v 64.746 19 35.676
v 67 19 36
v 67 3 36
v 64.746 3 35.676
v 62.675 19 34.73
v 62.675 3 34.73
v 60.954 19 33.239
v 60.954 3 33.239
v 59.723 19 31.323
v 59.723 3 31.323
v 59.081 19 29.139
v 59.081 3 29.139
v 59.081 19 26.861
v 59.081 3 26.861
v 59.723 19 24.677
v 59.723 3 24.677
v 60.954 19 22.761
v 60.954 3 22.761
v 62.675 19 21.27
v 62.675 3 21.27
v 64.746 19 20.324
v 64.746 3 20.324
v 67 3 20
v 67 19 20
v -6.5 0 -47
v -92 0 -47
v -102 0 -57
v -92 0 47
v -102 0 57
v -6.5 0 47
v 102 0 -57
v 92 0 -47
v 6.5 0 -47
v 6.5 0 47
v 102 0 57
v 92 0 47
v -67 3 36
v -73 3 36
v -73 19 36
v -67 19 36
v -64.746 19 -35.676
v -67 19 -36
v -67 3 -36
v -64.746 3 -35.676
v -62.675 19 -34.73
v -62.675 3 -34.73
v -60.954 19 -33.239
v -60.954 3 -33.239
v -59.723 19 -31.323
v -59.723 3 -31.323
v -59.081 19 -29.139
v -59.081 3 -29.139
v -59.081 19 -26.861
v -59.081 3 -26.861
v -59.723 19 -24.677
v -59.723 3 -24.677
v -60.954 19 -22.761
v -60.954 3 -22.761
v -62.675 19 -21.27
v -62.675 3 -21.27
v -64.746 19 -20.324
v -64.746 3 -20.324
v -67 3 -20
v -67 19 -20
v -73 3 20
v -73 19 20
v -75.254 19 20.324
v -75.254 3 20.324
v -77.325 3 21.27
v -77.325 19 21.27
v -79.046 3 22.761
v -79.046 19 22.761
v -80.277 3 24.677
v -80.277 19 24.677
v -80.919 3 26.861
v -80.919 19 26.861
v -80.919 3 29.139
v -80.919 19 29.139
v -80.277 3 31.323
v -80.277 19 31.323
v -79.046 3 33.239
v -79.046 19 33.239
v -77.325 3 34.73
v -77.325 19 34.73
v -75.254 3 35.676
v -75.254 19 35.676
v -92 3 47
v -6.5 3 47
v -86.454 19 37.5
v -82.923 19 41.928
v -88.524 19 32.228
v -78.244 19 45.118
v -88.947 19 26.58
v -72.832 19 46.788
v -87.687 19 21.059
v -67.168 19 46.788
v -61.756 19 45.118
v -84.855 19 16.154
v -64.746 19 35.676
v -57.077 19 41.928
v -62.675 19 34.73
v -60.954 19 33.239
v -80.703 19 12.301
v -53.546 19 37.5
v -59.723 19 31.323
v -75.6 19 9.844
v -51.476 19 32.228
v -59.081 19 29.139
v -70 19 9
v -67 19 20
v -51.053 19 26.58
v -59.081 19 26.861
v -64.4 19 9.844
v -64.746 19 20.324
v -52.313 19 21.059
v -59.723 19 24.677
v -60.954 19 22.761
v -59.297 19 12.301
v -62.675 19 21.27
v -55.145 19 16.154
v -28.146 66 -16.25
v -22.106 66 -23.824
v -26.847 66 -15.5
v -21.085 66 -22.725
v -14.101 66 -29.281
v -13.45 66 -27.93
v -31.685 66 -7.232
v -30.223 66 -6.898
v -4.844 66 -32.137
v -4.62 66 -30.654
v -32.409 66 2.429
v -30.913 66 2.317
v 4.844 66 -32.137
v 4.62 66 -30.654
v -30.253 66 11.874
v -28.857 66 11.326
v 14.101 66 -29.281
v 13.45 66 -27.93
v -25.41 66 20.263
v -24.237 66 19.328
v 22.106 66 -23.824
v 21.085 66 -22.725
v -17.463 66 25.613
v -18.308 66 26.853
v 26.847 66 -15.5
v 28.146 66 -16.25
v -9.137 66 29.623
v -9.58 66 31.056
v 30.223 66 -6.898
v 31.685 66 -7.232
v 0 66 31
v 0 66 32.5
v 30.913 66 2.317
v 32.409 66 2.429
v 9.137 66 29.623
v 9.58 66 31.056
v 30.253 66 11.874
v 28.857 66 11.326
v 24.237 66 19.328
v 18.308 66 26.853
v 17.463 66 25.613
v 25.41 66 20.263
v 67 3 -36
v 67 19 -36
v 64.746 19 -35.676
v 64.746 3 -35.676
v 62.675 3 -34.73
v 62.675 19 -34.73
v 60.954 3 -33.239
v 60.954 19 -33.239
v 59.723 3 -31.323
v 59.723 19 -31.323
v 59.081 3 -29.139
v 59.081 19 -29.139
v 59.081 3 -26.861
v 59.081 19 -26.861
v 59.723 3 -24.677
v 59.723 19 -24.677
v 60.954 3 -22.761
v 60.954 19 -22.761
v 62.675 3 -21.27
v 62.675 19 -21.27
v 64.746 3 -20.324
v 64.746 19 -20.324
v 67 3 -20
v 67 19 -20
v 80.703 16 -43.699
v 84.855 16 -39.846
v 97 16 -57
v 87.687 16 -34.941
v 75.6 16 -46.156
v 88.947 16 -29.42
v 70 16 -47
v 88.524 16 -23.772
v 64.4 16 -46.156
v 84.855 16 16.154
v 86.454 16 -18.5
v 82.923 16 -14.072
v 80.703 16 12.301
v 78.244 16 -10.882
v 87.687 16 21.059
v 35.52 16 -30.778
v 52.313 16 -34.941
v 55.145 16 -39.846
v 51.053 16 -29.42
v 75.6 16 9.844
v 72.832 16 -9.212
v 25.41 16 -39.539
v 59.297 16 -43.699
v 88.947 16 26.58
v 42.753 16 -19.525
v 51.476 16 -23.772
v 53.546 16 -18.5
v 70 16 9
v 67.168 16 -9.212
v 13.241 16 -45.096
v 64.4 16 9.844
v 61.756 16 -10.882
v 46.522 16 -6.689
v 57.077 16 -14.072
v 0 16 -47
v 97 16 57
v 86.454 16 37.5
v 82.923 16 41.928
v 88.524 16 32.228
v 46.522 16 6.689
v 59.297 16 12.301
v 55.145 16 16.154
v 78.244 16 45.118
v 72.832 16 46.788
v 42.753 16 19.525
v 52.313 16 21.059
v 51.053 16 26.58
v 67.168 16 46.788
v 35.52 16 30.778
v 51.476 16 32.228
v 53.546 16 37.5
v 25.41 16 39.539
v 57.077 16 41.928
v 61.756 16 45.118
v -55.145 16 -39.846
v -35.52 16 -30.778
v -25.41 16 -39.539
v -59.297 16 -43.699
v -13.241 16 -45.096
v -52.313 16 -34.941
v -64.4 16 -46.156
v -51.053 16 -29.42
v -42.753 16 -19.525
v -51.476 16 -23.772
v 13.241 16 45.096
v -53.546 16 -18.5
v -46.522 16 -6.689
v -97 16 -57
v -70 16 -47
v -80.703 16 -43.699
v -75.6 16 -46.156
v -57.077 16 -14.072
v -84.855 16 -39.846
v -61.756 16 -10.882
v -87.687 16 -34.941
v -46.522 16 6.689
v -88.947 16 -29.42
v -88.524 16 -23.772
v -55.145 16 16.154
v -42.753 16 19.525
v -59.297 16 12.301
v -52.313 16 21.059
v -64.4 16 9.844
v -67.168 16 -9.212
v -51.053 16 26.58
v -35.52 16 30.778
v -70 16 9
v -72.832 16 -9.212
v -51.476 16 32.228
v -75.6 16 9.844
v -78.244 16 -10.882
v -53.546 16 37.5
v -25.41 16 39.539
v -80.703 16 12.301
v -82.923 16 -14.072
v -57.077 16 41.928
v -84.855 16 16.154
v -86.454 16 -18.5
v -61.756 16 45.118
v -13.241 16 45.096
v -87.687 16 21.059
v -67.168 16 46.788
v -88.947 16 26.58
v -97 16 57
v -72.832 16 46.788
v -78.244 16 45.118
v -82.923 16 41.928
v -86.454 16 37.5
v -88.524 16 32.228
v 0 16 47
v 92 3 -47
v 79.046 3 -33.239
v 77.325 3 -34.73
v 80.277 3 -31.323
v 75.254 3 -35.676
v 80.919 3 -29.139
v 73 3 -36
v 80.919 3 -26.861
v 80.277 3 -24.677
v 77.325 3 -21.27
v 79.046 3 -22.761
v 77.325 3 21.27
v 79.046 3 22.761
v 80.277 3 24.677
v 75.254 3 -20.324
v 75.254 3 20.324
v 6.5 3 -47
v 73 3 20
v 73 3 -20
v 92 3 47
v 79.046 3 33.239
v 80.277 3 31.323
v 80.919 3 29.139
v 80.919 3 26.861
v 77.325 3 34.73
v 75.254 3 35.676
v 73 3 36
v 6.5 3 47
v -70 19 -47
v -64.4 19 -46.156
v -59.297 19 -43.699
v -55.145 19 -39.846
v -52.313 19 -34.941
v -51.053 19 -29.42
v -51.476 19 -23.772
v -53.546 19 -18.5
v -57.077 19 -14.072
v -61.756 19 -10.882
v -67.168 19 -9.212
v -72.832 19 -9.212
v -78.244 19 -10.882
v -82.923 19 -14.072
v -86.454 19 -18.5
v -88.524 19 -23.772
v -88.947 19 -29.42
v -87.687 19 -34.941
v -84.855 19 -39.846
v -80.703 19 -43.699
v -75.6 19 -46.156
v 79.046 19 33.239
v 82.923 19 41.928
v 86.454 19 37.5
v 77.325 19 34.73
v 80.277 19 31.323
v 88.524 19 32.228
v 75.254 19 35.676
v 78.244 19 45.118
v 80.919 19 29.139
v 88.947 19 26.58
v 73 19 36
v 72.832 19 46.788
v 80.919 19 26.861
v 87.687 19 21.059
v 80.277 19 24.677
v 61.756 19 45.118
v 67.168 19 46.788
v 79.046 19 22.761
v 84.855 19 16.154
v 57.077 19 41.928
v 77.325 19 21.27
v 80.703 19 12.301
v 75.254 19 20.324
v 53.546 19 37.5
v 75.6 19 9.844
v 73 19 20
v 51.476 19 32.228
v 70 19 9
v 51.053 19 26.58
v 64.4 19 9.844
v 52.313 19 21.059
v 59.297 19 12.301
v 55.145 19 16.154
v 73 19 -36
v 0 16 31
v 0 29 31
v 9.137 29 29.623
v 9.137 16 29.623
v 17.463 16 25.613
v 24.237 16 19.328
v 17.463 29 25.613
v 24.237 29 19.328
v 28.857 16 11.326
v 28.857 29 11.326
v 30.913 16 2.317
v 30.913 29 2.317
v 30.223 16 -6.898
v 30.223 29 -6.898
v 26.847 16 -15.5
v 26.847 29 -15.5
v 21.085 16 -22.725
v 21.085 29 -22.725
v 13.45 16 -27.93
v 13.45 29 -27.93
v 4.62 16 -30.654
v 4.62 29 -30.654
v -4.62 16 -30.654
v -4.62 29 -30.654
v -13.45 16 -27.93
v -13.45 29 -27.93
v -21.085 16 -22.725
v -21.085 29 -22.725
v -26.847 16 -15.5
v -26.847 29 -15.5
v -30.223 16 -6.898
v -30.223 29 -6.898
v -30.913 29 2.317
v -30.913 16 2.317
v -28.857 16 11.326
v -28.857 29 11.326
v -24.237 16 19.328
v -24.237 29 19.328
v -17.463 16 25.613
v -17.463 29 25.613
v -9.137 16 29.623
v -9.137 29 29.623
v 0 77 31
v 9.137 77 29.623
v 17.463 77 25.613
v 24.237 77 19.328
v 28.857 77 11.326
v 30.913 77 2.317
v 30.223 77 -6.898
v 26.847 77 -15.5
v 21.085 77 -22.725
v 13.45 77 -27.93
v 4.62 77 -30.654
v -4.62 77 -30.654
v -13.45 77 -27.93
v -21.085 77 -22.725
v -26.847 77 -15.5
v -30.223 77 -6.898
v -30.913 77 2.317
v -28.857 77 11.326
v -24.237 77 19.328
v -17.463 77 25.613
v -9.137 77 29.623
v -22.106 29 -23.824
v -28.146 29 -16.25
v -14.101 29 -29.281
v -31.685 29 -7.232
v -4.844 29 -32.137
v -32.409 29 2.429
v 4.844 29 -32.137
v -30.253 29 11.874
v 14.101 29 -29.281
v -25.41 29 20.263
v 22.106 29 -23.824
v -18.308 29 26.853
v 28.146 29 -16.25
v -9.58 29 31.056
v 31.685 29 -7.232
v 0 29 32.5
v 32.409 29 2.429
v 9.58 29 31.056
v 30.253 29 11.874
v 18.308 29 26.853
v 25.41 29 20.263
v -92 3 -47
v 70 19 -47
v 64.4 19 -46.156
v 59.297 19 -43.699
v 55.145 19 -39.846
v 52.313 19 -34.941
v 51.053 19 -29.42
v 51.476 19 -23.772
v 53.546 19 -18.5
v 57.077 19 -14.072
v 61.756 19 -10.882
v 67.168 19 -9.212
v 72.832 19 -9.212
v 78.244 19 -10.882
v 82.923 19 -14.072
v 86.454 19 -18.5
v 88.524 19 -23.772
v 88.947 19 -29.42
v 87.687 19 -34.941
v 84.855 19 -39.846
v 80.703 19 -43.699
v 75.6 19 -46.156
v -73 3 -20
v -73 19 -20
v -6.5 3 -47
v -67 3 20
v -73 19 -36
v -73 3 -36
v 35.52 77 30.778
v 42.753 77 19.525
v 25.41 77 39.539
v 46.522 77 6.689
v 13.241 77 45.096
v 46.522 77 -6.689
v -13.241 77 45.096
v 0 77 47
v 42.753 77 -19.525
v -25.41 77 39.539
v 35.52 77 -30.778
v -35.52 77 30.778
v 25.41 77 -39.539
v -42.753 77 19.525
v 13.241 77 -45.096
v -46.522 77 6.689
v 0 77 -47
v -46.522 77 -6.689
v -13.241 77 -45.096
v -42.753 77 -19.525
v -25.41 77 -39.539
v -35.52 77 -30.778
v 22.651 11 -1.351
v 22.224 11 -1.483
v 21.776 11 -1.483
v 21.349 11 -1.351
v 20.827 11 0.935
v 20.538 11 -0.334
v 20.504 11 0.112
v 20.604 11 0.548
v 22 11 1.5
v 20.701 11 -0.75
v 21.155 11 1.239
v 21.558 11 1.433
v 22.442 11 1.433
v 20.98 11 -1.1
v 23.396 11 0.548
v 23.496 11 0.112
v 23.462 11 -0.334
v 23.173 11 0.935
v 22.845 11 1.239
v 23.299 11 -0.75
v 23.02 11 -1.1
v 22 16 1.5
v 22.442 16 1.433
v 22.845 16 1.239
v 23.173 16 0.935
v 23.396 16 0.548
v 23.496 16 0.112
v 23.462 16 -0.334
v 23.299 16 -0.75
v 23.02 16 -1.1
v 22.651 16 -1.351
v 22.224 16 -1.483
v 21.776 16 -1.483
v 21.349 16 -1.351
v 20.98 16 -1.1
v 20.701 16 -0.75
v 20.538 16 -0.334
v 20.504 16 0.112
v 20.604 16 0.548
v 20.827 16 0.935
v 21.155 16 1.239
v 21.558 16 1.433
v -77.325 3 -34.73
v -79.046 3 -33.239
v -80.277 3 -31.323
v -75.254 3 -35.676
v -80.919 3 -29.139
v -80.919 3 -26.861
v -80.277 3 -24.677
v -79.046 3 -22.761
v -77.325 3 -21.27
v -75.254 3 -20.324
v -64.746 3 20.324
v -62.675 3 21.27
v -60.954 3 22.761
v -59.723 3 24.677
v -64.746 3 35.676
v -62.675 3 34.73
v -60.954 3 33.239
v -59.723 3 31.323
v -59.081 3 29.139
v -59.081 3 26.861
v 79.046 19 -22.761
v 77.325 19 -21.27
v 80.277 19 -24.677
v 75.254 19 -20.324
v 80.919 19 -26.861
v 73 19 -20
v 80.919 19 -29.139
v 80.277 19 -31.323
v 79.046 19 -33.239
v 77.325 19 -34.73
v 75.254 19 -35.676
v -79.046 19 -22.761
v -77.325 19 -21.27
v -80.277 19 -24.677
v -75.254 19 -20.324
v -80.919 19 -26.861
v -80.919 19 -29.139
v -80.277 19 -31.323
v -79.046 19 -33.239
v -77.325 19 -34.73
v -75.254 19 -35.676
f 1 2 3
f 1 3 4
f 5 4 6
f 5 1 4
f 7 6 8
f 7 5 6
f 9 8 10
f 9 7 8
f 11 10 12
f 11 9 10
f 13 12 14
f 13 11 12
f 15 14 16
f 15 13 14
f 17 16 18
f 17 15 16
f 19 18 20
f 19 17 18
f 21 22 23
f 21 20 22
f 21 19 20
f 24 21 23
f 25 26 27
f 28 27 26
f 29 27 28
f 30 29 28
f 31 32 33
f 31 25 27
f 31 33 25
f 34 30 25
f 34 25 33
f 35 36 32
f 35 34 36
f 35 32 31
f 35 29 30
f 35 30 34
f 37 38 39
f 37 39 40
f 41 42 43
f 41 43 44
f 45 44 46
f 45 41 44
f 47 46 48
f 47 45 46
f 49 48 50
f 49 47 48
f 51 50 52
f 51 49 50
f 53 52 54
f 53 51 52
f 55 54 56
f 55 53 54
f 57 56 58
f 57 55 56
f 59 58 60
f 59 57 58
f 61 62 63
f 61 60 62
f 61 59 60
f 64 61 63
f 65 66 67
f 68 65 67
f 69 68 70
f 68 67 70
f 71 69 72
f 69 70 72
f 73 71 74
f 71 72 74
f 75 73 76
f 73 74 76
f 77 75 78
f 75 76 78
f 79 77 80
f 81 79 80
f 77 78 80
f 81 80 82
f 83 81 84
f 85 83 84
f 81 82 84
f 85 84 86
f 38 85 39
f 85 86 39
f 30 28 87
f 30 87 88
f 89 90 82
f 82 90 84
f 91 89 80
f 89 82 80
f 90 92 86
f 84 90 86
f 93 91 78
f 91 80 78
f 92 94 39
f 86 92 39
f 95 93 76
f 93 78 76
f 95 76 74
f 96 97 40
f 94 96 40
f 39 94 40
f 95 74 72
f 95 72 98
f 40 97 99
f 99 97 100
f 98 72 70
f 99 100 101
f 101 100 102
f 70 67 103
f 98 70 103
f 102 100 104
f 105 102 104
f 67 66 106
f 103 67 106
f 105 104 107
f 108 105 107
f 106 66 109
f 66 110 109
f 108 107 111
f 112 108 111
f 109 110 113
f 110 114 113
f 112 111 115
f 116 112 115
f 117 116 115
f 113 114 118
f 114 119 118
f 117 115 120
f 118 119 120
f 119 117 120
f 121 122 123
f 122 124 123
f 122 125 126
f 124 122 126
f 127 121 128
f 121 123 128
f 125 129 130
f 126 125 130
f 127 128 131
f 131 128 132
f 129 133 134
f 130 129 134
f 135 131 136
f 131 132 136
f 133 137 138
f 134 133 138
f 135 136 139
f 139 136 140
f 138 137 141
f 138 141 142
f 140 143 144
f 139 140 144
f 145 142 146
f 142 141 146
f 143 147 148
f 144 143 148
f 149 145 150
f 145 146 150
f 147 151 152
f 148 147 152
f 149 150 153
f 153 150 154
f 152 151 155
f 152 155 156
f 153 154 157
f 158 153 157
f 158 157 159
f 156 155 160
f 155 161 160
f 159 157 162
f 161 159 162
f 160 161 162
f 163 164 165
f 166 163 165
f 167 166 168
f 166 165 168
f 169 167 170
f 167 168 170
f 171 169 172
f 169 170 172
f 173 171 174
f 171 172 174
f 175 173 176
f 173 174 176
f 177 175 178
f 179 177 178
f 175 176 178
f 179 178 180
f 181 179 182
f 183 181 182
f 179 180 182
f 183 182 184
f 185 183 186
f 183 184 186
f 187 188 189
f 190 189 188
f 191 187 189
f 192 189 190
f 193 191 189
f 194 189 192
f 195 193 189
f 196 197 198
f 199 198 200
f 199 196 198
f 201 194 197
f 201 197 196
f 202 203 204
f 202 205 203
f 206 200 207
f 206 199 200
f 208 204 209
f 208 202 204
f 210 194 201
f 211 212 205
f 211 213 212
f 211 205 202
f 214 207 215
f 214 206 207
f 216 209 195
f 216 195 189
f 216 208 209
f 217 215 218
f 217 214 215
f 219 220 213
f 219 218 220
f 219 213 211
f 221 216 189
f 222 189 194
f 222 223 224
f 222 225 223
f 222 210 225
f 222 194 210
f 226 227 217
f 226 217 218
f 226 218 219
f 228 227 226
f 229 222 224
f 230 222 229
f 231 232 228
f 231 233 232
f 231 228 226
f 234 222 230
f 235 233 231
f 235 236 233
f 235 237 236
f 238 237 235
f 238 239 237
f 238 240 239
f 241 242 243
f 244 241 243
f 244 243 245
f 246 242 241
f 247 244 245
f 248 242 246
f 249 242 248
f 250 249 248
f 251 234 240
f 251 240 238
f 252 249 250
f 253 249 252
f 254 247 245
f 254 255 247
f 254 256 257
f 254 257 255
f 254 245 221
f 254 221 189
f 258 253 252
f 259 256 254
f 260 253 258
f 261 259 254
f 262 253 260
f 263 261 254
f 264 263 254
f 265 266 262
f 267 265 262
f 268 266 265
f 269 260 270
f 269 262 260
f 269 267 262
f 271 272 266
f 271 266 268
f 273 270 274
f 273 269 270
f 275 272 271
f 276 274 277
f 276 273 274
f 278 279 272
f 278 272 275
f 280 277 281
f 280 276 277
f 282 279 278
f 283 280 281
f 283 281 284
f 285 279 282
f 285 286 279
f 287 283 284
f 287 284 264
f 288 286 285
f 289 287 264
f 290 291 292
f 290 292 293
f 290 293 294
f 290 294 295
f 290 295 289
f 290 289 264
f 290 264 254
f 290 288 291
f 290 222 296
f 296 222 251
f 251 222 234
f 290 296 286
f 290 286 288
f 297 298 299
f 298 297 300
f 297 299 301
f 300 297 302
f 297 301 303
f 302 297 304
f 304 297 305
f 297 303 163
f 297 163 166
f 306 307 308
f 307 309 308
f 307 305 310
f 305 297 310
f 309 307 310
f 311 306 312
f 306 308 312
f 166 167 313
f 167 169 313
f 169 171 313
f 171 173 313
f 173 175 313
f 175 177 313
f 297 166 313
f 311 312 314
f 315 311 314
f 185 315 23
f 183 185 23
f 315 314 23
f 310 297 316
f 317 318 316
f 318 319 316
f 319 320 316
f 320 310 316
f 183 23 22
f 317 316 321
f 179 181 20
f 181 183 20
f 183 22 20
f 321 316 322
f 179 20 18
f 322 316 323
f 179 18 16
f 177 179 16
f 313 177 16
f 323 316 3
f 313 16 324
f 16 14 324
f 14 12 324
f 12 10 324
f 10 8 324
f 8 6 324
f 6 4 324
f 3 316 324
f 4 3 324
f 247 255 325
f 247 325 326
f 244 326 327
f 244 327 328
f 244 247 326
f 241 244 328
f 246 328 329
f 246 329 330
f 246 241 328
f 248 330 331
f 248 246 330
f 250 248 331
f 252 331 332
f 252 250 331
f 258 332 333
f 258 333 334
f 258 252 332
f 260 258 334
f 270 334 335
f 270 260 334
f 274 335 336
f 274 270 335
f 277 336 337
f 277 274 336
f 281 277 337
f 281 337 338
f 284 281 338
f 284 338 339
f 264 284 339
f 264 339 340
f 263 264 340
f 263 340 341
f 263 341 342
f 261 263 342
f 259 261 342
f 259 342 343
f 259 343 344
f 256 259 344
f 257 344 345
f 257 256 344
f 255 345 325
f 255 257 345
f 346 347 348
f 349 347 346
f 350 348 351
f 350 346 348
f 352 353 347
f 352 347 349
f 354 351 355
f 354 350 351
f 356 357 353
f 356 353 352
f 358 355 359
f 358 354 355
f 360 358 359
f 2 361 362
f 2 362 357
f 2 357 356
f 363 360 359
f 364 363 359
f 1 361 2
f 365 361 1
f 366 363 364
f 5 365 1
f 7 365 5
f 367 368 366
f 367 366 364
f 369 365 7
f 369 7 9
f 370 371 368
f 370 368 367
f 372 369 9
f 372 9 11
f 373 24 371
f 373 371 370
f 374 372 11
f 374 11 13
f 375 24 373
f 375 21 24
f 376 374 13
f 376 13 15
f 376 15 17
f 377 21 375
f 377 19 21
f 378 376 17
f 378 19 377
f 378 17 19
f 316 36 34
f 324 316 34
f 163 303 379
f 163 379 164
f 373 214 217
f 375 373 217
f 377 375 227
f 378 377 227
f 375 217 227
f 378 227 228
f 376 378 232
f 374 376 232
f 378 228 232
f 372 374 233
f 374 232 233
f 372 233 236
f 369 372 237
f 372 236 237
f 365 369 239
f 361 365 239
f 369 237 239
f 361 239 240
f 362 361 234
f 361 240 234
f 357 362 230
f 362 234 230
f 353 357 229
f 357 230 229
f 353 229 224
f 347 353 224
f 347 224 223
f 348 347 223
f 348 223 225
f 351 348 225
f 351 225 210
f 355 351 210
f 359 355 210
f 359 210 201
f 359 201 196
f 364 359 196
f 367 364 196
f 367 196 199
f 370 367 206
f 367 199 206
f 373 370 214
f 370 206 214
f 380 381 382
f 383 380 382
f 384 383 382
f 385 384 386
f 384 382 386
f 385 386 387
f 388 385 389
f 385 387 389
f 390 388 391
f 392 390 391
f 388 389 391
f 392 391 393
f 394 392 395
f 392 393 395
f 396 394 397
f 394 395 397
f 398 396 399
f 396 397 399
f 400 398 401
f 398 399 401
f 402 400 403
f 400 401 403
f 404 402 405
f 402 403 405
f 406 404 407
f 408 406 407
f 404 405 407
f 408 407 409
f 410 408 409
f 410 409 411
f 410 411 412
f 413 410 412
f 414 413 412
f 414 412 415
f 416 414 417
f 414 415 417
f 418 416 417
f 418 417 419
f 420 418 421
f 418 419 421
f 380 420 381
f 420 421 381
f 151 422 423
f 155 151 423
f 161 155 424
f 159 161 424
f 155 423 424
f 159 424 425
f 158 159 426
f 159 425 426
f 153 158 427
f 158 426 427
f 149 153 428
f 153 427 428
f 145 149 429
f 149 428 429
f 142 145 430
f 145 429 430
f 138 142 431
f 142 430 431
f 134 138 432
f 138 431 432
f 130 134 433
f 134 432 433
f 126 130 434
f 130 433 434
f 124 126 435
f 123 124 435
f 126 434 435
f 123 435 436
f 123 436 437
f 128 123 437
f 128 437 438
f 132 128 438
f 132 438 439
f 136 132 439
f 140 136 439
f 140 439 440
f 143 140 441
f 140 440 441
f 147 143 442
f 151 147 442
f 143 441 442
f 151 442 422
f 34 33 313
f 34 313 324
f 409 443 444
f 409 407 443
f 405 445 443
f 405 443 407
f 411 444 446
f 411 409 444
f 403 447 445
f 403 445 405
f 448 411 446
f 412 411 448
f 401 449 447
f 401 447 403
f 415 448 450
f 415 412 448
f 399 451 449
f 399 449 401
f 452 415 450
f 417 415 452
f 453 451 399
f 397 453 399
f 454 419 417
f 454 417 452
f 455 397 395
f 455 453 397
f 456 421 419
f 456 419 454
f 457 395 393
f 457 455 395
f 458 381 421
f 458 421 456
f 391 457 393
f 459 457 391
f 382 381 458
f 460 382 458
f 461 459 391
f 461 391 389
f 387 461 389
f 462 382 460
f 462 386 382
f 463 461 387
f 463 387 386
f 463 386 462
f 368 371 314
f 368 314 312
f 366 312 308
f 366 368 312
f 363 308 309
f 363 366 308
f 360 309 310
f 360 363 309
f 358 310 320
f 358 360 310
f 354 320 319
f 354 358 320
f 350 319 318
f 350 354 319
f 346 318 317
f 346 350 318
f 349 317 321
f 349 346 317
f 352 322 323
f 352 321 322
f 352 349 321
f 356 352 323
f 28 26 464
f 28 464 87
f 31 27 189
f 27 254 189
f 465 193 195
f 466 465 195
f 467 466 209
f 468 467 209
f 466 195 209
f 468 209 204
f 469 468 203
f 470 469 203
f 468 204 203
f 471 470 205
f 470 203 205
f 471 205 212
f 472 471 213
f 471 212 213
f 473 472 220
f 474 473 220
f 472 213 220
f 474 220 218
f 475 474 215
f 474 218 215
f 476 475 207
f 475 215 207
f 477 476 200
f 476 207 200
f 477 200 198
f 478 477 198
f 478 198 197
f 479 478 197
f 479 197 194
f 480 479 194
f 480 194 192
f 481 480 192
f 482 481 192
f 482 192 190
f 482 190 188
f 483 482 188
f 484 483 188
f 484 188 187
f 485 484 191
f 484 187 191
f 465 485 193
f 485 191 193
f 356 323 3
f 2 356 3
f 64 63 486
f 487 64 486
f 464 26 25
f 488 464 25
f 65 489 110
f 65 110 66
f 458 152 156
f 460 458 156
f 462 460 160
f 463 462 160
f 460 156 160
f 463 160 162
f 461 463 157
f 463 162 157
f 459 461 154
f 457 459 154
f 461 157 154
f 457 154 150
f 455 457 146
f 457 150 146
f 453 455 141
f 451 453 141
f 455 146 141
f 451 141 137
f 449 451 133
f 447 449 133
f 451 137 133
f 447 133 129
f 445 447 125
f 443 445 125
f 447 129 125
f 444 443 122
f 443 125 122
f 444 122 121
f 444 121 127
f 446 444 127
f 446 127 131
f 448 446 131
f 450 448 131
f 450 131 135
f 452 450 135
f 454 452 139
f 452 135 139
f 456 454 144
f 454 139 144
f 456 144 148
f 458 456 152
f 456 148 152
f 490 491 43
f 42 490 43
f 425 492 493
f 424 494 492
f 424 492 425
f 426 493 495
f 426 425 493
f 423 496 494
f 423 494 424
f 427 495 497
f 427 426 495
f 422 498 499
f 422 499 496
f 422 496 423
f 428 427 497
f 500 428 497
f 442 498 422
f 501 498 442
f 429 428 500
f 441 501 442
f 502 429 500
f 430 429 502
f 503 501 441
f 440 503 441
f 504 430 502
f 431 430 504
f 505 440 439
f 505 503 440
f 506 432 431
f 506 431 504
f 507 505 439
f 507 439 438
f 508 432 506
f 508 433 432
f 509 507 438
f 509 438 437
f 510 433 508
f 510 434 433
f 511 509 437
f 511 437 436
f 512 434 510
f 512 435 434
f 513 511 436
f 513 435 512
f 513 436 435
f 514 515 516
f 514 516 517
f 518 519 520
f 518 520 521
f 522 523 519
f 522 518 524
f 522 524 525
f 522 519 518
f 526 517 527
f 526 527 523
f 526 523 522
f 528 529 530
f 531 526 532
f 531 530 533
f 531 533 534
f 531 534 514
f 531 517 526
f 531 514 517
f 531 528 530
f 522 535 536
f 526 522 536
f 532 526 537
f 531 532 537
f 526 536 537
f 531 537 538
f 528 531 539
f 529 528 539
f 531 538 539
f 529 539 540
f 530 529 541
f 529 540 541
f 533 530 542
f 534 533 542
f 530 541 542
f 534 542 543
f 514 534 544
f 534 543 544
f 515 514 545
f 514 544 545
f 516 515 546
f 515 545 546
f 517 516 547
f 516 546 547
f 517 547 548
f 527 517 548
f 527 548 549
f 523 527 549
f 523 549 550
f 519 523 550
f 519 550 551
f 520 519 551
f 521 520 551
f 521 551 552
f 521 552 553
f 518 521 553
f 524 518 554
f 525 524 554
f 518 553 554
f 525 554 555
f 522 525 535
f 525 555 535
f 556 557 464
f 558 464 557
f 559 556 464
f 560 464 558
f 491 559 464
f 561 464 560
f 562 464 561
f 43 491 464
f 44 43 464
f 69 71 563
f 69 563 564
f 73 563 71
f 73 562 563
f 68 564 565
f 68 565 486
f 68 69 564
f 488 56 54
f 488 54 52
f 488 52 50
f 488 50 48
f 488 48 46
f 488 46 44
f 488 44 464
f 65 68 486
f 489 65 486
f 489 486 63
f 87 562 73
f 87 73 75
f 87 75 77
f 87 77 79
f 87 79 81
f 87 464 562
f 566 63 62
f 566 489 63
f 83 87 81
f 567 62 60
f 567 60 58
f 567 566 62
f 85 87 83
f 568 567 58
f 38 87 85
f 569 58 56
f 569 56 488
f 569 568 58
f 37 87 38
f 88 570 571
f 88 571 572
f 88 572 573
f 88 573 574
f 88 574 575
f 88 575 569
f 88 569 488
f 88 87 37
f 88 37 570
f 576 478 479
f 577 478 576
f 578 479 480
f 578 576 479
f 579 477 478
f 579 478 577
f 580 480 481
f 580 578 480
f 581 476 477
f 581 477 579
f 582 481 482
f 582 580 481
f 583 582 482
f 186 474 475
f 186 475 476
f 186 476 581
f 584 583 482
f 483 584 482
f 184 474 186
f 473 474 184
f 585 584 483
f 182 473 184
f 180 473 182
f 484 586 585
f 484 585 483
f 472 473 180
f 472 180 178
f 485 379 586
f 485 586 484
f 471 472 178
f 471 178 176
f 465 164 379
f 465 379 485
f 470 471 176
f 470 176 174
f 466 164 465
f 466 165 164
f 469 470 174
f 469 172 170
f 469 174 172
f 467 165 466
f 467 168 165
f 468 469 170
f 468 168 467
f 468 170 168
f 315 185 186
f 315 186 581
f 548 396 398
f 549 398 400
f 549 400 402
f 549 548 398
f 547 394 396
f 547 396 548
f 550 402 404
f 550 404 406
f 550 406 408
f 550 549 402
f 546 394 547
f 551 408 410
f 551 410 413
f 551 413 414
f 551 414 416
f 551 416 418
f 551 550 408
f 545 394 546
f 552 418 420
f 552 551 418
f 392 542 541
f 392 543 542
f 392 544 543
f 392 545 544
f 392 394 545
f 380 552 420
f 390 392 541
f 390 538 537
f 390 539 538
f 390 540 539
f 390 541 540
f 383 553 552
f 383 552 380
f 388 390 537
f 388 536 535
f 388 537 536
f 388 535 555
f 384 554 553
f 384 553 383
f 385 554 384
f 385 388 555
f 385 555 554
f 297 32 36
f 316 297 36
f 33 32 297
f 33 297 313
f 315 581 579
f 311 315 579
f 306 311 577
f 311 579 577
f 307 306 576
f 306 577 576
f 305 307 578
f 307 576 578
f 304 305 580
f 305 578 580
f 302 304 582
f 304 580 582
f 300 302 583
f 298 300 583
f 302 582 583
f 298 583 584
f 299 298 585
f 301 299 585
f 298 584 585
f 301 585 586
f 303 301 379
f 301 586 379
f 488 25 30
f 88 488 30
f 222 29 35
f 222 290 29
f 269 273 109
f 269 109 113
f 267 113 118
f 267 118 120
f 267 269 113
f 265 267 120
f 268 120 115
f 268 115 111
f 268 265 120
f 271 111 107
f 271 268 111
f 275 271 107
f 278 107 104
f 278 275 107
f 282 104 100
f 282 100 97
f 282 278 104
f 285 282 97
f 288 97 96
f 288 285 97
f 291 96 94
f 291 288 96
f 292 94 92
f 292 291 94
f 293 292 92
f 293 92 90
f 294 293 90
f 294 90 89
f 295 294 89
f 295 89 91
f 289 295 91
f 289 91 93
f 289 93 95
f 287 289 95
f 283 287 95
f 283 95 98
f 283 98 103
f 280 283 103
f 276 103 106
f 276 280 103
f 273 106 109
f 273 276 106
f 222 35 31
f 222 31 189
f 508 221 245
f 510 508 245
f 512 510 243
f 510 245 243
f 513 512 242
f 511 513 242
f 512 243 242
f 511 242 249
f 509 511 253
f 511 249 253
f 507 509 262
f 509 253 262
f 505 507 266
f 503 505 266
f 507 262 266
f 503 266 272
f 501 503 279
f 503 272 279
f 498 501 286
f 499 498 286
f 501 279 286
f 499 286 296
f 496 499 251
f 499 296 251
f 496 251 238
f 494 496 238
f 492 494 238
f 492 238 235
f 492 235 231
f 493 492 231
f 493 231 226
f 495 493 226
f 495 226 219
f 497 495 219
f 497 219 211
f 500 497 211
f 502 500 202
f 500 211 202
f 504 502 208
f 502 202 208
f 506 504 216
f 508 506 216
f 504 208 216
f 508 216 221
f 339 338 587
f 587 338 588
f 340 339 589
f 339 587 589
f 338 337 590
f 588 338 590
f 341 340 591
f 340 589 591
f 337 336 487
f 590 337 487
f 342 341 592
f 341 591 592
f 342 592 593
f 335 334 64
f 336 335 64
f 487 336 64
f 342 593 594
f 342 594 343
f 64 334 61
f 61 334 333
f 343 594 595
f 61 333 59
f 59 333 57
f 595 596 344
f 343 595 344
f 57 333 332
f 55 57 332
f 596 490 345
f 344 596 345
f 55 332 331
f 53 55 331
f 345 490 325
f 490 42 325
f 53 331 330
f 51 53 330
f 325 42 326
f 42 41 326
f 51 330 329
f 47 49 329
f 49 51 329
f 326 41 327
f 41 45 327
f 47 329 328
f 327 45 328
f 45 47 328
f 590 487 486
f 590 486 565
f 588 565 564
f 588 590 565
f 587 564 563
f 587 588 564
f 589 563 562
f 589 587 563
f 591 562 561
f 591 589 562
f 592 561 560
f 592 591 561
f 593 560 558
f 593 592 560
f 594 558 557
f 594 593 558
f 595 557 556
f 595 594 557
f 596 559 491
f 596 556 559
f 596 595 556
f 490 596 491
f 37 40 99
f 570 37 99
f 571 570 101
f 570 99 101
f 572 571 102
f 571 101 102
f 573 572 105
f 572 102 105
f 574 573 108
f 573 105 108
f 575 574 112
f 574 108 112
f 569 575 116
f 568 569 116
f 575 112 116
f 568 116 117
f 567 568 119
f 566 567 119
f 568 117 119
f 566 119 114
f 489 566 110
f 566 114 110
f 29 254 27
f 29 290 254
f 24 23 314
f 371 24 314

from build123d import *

# Parameters (mm, degrees)
BOSS_EXTRUDE1_DEPTH  = 57
SKETCH2_W            = 85.5
SKETCH2_H            = 94
CUT_EXTRUDE1_DEPTH   = 3
SKETCH4_R            = 47
BOSS_EXTRUDE2_DEPTH  = 61
SKETCH6_R            = 19
BOSS_EXTRUDE4_DEPTH  = 3
CUT_EXTRUDE2_DEPTH   = 20
MIRROR4_COPY_1_DEPTH = 20
SKETCH10_R           = 31
CUT_EXTRUDE3_DEPTH   = 11
SKETCH11_R           = 32.5
CUT_EXTRUDE4_DEPTH   = 37
SKETCH12_R           = 31
CUT_EXTRUDE5_DEPTH   = 13
SKETCH13_R           = 1.5
CUT_EXTRUDE6_DEPTH   = 5


with BuildPart() as part:
    # Sketch1 → Boss-Extrude1 (new body, symmetric)
    with BuildSketch(Plane.XY):
        Polygon((-102, 0), (102, 0), (97, 16), (-97, 16), align=None)
    extrude(amount=BOSS_EXTRUDE1_DEPTH, both=True)

    # Sketch2 → Cut-Extrude1 (cut)
    with BuildSketch(Plane.XZ):
        with Locations((-49.25, 0)):
            Rectangle(SKETCH2_W, SKETCH2_H)
    cut_extrude1 = extrude(amount=-CUT_EXTRUDE1_DEPTH, mode=Mode.SUBTRACT)

    # Mirror1: Cut-Extrude1 across plane
    add(cut_extrude1.mirror(Plane(origin=(0, 0, 0), x_dir=(0, 0, 1), z_dir=(1, 0, 0))), mode=Mode.SUBTRACT)

    # Sketch4 → Boss-Extrude2 (add)
    with BuildSketch(Plane(origin=(0, 16, 0), x_dir=(1, 0, 0), z_dir=(0, 1, 0))):
        with Locations(Location((0, 0, 0), (0, 0, 90))):  # turned: the seam where the file's is
            Circle(SKETCH4_R)
    extrude(amount=BOSS_EXTRUDE2_DEPTH)

    # Sketch6 → Boss-Extrude4 (add)
    with BuildSketch(Plane(origin=(0, 16, 0), x_dir=(1, 0, 0), z_dir=(0, 1, 0))):
        with Locations(Location((70, -28, 0), (0, 0, 90))):  # turned: the seam where the file's is
            Circle(SKETCH6_R)
        with Locations(Location((70, 28, 0), (0, 0, 90))):  # turned: the seam where the file's is
            Circle(SKETCH6_R)
    boss_extrude4 = extrude(amount=BOSS_EXTRUDE4_DEPTH)

    # Sketch9 → Cut-Extrude2 (cut, through all)
    with BuildSketch(Plane(origin=(0, 19, 0), x_dir=(1, 0, 0), z_dir=(0, 1, 0))):
        with BuildLine():
            Line((73, -36), (67, -36))
            ThreePointArc((67, -36), (59, -28), (67, -20))
            Line((67, -20), (73, -20))
            ThreePointArc((73, -20), (81, -28), (73, -36))
        make_face()
    cut_extrude2 = extrude(amount=-CUT_EXTRUDE2_DEPTH, mode=Mode.SUBTRACT)

    # Mirror2: Boss-Extrude4 across plane
    add(boss_extrude4.mirror(Plane(origin=(0, 0, 0), x_dir=(0, 0, 1), z_dir=(1, 0, 0))))

    # Mirror3: Cut-Extrude2 across plane
    add(cut_extrude2.mirror(Plane.XY), mode=Mode.SUBTRACT)

    # Mirror4: Cut-Extrude2 across plane
    add(cut_extrude2.mirror(Plane(origin=(0, 0, 0), x_dir=(0, 0, 1), z_dir=(1, 0, 0))), mode=Mode.SUBTRACT)

    # Mirror4 copy 1 sketch → Mirror4 copy 1 (cut, through all)
    with BuildSketch(Plane(origin=(0, 19, 0), x_dir=(-1, 0, 0), z_dir=(0, 1, 0))):
        with BuildLine():
            Line((73, -36), (67, -36))
            ThreePointArc((67, -36), (59, -28), (67, -20))
            Line((67, -20), (73, -20))
            ThreePointArc((73, -20), (81, -28), (73, -36))
        make_face()
    extrude(amount=-MIRROR4_COPY_1_DEPTH, mode=Mode.SUBTRACT)

    # Sketch10 → Cut-Extrude3 (cut)
    with BuildSketch(Plane(origin=(0, 77, 0), x_dir=(1, 0, 0), z_dir=(0, 1, 0))):
        with Locations(Location((0, 0, 0), (0, 0, 270))):  # turned: the seam where the file's is
            Circle(SKETCH10_R)
    extrude(amount=-CUT_EXTRUDE3_DEPTH, mode=Mode.SUBTRACT)

    # Sketch11 → Cut-Extrude4 (cut)
    with BuildSketch(Plane(origin=(0, 66, 0), x_dir=(1, 0, 0), z_dir=(0, 1, 0))):
        with Locations(Location((0, 0, 0), (0, 0, 270))):  # turned: the seam where the file's is
            Circle(SKETCH11_R)
    extrude(amount=-CUT_EXTRUDE4_DEPTH, mode=Mode.SUBTRACT)

    # Sketch12 → Cut-Extrude5 (cut)
    with BuildSketch(Plane(origin=(0, 29, 0), x_dir=(1, 0, 0), z_dir=(0, 1, 0))):
        with Locations(Location((0, 0, 0), (0, 0, 270))):  # turned: the seam where the file's is
            Circle(SKETCH12_R)
    extrude(amount=-CUT_EXTRUDE5_DEPTH, mode=Mode.SUBTRACT)

    # Sketch13 → Cut-Extrude6 (cut)
    with BuildSketch(Plane(origin=(0, 16, 0), x_dir=(1, 0, 0), z_dir=(0, 1, 0))):
        with Locations(Location((22, 0, 0), (0, 0, 270))):  # turned: the seam where the file's is
            Circle(SKETCH13_R)
    extrude(amount=-CUT_EXTRUDE6_DEPTH, mode=Mode.SUBTRACT)


solid = part.part
